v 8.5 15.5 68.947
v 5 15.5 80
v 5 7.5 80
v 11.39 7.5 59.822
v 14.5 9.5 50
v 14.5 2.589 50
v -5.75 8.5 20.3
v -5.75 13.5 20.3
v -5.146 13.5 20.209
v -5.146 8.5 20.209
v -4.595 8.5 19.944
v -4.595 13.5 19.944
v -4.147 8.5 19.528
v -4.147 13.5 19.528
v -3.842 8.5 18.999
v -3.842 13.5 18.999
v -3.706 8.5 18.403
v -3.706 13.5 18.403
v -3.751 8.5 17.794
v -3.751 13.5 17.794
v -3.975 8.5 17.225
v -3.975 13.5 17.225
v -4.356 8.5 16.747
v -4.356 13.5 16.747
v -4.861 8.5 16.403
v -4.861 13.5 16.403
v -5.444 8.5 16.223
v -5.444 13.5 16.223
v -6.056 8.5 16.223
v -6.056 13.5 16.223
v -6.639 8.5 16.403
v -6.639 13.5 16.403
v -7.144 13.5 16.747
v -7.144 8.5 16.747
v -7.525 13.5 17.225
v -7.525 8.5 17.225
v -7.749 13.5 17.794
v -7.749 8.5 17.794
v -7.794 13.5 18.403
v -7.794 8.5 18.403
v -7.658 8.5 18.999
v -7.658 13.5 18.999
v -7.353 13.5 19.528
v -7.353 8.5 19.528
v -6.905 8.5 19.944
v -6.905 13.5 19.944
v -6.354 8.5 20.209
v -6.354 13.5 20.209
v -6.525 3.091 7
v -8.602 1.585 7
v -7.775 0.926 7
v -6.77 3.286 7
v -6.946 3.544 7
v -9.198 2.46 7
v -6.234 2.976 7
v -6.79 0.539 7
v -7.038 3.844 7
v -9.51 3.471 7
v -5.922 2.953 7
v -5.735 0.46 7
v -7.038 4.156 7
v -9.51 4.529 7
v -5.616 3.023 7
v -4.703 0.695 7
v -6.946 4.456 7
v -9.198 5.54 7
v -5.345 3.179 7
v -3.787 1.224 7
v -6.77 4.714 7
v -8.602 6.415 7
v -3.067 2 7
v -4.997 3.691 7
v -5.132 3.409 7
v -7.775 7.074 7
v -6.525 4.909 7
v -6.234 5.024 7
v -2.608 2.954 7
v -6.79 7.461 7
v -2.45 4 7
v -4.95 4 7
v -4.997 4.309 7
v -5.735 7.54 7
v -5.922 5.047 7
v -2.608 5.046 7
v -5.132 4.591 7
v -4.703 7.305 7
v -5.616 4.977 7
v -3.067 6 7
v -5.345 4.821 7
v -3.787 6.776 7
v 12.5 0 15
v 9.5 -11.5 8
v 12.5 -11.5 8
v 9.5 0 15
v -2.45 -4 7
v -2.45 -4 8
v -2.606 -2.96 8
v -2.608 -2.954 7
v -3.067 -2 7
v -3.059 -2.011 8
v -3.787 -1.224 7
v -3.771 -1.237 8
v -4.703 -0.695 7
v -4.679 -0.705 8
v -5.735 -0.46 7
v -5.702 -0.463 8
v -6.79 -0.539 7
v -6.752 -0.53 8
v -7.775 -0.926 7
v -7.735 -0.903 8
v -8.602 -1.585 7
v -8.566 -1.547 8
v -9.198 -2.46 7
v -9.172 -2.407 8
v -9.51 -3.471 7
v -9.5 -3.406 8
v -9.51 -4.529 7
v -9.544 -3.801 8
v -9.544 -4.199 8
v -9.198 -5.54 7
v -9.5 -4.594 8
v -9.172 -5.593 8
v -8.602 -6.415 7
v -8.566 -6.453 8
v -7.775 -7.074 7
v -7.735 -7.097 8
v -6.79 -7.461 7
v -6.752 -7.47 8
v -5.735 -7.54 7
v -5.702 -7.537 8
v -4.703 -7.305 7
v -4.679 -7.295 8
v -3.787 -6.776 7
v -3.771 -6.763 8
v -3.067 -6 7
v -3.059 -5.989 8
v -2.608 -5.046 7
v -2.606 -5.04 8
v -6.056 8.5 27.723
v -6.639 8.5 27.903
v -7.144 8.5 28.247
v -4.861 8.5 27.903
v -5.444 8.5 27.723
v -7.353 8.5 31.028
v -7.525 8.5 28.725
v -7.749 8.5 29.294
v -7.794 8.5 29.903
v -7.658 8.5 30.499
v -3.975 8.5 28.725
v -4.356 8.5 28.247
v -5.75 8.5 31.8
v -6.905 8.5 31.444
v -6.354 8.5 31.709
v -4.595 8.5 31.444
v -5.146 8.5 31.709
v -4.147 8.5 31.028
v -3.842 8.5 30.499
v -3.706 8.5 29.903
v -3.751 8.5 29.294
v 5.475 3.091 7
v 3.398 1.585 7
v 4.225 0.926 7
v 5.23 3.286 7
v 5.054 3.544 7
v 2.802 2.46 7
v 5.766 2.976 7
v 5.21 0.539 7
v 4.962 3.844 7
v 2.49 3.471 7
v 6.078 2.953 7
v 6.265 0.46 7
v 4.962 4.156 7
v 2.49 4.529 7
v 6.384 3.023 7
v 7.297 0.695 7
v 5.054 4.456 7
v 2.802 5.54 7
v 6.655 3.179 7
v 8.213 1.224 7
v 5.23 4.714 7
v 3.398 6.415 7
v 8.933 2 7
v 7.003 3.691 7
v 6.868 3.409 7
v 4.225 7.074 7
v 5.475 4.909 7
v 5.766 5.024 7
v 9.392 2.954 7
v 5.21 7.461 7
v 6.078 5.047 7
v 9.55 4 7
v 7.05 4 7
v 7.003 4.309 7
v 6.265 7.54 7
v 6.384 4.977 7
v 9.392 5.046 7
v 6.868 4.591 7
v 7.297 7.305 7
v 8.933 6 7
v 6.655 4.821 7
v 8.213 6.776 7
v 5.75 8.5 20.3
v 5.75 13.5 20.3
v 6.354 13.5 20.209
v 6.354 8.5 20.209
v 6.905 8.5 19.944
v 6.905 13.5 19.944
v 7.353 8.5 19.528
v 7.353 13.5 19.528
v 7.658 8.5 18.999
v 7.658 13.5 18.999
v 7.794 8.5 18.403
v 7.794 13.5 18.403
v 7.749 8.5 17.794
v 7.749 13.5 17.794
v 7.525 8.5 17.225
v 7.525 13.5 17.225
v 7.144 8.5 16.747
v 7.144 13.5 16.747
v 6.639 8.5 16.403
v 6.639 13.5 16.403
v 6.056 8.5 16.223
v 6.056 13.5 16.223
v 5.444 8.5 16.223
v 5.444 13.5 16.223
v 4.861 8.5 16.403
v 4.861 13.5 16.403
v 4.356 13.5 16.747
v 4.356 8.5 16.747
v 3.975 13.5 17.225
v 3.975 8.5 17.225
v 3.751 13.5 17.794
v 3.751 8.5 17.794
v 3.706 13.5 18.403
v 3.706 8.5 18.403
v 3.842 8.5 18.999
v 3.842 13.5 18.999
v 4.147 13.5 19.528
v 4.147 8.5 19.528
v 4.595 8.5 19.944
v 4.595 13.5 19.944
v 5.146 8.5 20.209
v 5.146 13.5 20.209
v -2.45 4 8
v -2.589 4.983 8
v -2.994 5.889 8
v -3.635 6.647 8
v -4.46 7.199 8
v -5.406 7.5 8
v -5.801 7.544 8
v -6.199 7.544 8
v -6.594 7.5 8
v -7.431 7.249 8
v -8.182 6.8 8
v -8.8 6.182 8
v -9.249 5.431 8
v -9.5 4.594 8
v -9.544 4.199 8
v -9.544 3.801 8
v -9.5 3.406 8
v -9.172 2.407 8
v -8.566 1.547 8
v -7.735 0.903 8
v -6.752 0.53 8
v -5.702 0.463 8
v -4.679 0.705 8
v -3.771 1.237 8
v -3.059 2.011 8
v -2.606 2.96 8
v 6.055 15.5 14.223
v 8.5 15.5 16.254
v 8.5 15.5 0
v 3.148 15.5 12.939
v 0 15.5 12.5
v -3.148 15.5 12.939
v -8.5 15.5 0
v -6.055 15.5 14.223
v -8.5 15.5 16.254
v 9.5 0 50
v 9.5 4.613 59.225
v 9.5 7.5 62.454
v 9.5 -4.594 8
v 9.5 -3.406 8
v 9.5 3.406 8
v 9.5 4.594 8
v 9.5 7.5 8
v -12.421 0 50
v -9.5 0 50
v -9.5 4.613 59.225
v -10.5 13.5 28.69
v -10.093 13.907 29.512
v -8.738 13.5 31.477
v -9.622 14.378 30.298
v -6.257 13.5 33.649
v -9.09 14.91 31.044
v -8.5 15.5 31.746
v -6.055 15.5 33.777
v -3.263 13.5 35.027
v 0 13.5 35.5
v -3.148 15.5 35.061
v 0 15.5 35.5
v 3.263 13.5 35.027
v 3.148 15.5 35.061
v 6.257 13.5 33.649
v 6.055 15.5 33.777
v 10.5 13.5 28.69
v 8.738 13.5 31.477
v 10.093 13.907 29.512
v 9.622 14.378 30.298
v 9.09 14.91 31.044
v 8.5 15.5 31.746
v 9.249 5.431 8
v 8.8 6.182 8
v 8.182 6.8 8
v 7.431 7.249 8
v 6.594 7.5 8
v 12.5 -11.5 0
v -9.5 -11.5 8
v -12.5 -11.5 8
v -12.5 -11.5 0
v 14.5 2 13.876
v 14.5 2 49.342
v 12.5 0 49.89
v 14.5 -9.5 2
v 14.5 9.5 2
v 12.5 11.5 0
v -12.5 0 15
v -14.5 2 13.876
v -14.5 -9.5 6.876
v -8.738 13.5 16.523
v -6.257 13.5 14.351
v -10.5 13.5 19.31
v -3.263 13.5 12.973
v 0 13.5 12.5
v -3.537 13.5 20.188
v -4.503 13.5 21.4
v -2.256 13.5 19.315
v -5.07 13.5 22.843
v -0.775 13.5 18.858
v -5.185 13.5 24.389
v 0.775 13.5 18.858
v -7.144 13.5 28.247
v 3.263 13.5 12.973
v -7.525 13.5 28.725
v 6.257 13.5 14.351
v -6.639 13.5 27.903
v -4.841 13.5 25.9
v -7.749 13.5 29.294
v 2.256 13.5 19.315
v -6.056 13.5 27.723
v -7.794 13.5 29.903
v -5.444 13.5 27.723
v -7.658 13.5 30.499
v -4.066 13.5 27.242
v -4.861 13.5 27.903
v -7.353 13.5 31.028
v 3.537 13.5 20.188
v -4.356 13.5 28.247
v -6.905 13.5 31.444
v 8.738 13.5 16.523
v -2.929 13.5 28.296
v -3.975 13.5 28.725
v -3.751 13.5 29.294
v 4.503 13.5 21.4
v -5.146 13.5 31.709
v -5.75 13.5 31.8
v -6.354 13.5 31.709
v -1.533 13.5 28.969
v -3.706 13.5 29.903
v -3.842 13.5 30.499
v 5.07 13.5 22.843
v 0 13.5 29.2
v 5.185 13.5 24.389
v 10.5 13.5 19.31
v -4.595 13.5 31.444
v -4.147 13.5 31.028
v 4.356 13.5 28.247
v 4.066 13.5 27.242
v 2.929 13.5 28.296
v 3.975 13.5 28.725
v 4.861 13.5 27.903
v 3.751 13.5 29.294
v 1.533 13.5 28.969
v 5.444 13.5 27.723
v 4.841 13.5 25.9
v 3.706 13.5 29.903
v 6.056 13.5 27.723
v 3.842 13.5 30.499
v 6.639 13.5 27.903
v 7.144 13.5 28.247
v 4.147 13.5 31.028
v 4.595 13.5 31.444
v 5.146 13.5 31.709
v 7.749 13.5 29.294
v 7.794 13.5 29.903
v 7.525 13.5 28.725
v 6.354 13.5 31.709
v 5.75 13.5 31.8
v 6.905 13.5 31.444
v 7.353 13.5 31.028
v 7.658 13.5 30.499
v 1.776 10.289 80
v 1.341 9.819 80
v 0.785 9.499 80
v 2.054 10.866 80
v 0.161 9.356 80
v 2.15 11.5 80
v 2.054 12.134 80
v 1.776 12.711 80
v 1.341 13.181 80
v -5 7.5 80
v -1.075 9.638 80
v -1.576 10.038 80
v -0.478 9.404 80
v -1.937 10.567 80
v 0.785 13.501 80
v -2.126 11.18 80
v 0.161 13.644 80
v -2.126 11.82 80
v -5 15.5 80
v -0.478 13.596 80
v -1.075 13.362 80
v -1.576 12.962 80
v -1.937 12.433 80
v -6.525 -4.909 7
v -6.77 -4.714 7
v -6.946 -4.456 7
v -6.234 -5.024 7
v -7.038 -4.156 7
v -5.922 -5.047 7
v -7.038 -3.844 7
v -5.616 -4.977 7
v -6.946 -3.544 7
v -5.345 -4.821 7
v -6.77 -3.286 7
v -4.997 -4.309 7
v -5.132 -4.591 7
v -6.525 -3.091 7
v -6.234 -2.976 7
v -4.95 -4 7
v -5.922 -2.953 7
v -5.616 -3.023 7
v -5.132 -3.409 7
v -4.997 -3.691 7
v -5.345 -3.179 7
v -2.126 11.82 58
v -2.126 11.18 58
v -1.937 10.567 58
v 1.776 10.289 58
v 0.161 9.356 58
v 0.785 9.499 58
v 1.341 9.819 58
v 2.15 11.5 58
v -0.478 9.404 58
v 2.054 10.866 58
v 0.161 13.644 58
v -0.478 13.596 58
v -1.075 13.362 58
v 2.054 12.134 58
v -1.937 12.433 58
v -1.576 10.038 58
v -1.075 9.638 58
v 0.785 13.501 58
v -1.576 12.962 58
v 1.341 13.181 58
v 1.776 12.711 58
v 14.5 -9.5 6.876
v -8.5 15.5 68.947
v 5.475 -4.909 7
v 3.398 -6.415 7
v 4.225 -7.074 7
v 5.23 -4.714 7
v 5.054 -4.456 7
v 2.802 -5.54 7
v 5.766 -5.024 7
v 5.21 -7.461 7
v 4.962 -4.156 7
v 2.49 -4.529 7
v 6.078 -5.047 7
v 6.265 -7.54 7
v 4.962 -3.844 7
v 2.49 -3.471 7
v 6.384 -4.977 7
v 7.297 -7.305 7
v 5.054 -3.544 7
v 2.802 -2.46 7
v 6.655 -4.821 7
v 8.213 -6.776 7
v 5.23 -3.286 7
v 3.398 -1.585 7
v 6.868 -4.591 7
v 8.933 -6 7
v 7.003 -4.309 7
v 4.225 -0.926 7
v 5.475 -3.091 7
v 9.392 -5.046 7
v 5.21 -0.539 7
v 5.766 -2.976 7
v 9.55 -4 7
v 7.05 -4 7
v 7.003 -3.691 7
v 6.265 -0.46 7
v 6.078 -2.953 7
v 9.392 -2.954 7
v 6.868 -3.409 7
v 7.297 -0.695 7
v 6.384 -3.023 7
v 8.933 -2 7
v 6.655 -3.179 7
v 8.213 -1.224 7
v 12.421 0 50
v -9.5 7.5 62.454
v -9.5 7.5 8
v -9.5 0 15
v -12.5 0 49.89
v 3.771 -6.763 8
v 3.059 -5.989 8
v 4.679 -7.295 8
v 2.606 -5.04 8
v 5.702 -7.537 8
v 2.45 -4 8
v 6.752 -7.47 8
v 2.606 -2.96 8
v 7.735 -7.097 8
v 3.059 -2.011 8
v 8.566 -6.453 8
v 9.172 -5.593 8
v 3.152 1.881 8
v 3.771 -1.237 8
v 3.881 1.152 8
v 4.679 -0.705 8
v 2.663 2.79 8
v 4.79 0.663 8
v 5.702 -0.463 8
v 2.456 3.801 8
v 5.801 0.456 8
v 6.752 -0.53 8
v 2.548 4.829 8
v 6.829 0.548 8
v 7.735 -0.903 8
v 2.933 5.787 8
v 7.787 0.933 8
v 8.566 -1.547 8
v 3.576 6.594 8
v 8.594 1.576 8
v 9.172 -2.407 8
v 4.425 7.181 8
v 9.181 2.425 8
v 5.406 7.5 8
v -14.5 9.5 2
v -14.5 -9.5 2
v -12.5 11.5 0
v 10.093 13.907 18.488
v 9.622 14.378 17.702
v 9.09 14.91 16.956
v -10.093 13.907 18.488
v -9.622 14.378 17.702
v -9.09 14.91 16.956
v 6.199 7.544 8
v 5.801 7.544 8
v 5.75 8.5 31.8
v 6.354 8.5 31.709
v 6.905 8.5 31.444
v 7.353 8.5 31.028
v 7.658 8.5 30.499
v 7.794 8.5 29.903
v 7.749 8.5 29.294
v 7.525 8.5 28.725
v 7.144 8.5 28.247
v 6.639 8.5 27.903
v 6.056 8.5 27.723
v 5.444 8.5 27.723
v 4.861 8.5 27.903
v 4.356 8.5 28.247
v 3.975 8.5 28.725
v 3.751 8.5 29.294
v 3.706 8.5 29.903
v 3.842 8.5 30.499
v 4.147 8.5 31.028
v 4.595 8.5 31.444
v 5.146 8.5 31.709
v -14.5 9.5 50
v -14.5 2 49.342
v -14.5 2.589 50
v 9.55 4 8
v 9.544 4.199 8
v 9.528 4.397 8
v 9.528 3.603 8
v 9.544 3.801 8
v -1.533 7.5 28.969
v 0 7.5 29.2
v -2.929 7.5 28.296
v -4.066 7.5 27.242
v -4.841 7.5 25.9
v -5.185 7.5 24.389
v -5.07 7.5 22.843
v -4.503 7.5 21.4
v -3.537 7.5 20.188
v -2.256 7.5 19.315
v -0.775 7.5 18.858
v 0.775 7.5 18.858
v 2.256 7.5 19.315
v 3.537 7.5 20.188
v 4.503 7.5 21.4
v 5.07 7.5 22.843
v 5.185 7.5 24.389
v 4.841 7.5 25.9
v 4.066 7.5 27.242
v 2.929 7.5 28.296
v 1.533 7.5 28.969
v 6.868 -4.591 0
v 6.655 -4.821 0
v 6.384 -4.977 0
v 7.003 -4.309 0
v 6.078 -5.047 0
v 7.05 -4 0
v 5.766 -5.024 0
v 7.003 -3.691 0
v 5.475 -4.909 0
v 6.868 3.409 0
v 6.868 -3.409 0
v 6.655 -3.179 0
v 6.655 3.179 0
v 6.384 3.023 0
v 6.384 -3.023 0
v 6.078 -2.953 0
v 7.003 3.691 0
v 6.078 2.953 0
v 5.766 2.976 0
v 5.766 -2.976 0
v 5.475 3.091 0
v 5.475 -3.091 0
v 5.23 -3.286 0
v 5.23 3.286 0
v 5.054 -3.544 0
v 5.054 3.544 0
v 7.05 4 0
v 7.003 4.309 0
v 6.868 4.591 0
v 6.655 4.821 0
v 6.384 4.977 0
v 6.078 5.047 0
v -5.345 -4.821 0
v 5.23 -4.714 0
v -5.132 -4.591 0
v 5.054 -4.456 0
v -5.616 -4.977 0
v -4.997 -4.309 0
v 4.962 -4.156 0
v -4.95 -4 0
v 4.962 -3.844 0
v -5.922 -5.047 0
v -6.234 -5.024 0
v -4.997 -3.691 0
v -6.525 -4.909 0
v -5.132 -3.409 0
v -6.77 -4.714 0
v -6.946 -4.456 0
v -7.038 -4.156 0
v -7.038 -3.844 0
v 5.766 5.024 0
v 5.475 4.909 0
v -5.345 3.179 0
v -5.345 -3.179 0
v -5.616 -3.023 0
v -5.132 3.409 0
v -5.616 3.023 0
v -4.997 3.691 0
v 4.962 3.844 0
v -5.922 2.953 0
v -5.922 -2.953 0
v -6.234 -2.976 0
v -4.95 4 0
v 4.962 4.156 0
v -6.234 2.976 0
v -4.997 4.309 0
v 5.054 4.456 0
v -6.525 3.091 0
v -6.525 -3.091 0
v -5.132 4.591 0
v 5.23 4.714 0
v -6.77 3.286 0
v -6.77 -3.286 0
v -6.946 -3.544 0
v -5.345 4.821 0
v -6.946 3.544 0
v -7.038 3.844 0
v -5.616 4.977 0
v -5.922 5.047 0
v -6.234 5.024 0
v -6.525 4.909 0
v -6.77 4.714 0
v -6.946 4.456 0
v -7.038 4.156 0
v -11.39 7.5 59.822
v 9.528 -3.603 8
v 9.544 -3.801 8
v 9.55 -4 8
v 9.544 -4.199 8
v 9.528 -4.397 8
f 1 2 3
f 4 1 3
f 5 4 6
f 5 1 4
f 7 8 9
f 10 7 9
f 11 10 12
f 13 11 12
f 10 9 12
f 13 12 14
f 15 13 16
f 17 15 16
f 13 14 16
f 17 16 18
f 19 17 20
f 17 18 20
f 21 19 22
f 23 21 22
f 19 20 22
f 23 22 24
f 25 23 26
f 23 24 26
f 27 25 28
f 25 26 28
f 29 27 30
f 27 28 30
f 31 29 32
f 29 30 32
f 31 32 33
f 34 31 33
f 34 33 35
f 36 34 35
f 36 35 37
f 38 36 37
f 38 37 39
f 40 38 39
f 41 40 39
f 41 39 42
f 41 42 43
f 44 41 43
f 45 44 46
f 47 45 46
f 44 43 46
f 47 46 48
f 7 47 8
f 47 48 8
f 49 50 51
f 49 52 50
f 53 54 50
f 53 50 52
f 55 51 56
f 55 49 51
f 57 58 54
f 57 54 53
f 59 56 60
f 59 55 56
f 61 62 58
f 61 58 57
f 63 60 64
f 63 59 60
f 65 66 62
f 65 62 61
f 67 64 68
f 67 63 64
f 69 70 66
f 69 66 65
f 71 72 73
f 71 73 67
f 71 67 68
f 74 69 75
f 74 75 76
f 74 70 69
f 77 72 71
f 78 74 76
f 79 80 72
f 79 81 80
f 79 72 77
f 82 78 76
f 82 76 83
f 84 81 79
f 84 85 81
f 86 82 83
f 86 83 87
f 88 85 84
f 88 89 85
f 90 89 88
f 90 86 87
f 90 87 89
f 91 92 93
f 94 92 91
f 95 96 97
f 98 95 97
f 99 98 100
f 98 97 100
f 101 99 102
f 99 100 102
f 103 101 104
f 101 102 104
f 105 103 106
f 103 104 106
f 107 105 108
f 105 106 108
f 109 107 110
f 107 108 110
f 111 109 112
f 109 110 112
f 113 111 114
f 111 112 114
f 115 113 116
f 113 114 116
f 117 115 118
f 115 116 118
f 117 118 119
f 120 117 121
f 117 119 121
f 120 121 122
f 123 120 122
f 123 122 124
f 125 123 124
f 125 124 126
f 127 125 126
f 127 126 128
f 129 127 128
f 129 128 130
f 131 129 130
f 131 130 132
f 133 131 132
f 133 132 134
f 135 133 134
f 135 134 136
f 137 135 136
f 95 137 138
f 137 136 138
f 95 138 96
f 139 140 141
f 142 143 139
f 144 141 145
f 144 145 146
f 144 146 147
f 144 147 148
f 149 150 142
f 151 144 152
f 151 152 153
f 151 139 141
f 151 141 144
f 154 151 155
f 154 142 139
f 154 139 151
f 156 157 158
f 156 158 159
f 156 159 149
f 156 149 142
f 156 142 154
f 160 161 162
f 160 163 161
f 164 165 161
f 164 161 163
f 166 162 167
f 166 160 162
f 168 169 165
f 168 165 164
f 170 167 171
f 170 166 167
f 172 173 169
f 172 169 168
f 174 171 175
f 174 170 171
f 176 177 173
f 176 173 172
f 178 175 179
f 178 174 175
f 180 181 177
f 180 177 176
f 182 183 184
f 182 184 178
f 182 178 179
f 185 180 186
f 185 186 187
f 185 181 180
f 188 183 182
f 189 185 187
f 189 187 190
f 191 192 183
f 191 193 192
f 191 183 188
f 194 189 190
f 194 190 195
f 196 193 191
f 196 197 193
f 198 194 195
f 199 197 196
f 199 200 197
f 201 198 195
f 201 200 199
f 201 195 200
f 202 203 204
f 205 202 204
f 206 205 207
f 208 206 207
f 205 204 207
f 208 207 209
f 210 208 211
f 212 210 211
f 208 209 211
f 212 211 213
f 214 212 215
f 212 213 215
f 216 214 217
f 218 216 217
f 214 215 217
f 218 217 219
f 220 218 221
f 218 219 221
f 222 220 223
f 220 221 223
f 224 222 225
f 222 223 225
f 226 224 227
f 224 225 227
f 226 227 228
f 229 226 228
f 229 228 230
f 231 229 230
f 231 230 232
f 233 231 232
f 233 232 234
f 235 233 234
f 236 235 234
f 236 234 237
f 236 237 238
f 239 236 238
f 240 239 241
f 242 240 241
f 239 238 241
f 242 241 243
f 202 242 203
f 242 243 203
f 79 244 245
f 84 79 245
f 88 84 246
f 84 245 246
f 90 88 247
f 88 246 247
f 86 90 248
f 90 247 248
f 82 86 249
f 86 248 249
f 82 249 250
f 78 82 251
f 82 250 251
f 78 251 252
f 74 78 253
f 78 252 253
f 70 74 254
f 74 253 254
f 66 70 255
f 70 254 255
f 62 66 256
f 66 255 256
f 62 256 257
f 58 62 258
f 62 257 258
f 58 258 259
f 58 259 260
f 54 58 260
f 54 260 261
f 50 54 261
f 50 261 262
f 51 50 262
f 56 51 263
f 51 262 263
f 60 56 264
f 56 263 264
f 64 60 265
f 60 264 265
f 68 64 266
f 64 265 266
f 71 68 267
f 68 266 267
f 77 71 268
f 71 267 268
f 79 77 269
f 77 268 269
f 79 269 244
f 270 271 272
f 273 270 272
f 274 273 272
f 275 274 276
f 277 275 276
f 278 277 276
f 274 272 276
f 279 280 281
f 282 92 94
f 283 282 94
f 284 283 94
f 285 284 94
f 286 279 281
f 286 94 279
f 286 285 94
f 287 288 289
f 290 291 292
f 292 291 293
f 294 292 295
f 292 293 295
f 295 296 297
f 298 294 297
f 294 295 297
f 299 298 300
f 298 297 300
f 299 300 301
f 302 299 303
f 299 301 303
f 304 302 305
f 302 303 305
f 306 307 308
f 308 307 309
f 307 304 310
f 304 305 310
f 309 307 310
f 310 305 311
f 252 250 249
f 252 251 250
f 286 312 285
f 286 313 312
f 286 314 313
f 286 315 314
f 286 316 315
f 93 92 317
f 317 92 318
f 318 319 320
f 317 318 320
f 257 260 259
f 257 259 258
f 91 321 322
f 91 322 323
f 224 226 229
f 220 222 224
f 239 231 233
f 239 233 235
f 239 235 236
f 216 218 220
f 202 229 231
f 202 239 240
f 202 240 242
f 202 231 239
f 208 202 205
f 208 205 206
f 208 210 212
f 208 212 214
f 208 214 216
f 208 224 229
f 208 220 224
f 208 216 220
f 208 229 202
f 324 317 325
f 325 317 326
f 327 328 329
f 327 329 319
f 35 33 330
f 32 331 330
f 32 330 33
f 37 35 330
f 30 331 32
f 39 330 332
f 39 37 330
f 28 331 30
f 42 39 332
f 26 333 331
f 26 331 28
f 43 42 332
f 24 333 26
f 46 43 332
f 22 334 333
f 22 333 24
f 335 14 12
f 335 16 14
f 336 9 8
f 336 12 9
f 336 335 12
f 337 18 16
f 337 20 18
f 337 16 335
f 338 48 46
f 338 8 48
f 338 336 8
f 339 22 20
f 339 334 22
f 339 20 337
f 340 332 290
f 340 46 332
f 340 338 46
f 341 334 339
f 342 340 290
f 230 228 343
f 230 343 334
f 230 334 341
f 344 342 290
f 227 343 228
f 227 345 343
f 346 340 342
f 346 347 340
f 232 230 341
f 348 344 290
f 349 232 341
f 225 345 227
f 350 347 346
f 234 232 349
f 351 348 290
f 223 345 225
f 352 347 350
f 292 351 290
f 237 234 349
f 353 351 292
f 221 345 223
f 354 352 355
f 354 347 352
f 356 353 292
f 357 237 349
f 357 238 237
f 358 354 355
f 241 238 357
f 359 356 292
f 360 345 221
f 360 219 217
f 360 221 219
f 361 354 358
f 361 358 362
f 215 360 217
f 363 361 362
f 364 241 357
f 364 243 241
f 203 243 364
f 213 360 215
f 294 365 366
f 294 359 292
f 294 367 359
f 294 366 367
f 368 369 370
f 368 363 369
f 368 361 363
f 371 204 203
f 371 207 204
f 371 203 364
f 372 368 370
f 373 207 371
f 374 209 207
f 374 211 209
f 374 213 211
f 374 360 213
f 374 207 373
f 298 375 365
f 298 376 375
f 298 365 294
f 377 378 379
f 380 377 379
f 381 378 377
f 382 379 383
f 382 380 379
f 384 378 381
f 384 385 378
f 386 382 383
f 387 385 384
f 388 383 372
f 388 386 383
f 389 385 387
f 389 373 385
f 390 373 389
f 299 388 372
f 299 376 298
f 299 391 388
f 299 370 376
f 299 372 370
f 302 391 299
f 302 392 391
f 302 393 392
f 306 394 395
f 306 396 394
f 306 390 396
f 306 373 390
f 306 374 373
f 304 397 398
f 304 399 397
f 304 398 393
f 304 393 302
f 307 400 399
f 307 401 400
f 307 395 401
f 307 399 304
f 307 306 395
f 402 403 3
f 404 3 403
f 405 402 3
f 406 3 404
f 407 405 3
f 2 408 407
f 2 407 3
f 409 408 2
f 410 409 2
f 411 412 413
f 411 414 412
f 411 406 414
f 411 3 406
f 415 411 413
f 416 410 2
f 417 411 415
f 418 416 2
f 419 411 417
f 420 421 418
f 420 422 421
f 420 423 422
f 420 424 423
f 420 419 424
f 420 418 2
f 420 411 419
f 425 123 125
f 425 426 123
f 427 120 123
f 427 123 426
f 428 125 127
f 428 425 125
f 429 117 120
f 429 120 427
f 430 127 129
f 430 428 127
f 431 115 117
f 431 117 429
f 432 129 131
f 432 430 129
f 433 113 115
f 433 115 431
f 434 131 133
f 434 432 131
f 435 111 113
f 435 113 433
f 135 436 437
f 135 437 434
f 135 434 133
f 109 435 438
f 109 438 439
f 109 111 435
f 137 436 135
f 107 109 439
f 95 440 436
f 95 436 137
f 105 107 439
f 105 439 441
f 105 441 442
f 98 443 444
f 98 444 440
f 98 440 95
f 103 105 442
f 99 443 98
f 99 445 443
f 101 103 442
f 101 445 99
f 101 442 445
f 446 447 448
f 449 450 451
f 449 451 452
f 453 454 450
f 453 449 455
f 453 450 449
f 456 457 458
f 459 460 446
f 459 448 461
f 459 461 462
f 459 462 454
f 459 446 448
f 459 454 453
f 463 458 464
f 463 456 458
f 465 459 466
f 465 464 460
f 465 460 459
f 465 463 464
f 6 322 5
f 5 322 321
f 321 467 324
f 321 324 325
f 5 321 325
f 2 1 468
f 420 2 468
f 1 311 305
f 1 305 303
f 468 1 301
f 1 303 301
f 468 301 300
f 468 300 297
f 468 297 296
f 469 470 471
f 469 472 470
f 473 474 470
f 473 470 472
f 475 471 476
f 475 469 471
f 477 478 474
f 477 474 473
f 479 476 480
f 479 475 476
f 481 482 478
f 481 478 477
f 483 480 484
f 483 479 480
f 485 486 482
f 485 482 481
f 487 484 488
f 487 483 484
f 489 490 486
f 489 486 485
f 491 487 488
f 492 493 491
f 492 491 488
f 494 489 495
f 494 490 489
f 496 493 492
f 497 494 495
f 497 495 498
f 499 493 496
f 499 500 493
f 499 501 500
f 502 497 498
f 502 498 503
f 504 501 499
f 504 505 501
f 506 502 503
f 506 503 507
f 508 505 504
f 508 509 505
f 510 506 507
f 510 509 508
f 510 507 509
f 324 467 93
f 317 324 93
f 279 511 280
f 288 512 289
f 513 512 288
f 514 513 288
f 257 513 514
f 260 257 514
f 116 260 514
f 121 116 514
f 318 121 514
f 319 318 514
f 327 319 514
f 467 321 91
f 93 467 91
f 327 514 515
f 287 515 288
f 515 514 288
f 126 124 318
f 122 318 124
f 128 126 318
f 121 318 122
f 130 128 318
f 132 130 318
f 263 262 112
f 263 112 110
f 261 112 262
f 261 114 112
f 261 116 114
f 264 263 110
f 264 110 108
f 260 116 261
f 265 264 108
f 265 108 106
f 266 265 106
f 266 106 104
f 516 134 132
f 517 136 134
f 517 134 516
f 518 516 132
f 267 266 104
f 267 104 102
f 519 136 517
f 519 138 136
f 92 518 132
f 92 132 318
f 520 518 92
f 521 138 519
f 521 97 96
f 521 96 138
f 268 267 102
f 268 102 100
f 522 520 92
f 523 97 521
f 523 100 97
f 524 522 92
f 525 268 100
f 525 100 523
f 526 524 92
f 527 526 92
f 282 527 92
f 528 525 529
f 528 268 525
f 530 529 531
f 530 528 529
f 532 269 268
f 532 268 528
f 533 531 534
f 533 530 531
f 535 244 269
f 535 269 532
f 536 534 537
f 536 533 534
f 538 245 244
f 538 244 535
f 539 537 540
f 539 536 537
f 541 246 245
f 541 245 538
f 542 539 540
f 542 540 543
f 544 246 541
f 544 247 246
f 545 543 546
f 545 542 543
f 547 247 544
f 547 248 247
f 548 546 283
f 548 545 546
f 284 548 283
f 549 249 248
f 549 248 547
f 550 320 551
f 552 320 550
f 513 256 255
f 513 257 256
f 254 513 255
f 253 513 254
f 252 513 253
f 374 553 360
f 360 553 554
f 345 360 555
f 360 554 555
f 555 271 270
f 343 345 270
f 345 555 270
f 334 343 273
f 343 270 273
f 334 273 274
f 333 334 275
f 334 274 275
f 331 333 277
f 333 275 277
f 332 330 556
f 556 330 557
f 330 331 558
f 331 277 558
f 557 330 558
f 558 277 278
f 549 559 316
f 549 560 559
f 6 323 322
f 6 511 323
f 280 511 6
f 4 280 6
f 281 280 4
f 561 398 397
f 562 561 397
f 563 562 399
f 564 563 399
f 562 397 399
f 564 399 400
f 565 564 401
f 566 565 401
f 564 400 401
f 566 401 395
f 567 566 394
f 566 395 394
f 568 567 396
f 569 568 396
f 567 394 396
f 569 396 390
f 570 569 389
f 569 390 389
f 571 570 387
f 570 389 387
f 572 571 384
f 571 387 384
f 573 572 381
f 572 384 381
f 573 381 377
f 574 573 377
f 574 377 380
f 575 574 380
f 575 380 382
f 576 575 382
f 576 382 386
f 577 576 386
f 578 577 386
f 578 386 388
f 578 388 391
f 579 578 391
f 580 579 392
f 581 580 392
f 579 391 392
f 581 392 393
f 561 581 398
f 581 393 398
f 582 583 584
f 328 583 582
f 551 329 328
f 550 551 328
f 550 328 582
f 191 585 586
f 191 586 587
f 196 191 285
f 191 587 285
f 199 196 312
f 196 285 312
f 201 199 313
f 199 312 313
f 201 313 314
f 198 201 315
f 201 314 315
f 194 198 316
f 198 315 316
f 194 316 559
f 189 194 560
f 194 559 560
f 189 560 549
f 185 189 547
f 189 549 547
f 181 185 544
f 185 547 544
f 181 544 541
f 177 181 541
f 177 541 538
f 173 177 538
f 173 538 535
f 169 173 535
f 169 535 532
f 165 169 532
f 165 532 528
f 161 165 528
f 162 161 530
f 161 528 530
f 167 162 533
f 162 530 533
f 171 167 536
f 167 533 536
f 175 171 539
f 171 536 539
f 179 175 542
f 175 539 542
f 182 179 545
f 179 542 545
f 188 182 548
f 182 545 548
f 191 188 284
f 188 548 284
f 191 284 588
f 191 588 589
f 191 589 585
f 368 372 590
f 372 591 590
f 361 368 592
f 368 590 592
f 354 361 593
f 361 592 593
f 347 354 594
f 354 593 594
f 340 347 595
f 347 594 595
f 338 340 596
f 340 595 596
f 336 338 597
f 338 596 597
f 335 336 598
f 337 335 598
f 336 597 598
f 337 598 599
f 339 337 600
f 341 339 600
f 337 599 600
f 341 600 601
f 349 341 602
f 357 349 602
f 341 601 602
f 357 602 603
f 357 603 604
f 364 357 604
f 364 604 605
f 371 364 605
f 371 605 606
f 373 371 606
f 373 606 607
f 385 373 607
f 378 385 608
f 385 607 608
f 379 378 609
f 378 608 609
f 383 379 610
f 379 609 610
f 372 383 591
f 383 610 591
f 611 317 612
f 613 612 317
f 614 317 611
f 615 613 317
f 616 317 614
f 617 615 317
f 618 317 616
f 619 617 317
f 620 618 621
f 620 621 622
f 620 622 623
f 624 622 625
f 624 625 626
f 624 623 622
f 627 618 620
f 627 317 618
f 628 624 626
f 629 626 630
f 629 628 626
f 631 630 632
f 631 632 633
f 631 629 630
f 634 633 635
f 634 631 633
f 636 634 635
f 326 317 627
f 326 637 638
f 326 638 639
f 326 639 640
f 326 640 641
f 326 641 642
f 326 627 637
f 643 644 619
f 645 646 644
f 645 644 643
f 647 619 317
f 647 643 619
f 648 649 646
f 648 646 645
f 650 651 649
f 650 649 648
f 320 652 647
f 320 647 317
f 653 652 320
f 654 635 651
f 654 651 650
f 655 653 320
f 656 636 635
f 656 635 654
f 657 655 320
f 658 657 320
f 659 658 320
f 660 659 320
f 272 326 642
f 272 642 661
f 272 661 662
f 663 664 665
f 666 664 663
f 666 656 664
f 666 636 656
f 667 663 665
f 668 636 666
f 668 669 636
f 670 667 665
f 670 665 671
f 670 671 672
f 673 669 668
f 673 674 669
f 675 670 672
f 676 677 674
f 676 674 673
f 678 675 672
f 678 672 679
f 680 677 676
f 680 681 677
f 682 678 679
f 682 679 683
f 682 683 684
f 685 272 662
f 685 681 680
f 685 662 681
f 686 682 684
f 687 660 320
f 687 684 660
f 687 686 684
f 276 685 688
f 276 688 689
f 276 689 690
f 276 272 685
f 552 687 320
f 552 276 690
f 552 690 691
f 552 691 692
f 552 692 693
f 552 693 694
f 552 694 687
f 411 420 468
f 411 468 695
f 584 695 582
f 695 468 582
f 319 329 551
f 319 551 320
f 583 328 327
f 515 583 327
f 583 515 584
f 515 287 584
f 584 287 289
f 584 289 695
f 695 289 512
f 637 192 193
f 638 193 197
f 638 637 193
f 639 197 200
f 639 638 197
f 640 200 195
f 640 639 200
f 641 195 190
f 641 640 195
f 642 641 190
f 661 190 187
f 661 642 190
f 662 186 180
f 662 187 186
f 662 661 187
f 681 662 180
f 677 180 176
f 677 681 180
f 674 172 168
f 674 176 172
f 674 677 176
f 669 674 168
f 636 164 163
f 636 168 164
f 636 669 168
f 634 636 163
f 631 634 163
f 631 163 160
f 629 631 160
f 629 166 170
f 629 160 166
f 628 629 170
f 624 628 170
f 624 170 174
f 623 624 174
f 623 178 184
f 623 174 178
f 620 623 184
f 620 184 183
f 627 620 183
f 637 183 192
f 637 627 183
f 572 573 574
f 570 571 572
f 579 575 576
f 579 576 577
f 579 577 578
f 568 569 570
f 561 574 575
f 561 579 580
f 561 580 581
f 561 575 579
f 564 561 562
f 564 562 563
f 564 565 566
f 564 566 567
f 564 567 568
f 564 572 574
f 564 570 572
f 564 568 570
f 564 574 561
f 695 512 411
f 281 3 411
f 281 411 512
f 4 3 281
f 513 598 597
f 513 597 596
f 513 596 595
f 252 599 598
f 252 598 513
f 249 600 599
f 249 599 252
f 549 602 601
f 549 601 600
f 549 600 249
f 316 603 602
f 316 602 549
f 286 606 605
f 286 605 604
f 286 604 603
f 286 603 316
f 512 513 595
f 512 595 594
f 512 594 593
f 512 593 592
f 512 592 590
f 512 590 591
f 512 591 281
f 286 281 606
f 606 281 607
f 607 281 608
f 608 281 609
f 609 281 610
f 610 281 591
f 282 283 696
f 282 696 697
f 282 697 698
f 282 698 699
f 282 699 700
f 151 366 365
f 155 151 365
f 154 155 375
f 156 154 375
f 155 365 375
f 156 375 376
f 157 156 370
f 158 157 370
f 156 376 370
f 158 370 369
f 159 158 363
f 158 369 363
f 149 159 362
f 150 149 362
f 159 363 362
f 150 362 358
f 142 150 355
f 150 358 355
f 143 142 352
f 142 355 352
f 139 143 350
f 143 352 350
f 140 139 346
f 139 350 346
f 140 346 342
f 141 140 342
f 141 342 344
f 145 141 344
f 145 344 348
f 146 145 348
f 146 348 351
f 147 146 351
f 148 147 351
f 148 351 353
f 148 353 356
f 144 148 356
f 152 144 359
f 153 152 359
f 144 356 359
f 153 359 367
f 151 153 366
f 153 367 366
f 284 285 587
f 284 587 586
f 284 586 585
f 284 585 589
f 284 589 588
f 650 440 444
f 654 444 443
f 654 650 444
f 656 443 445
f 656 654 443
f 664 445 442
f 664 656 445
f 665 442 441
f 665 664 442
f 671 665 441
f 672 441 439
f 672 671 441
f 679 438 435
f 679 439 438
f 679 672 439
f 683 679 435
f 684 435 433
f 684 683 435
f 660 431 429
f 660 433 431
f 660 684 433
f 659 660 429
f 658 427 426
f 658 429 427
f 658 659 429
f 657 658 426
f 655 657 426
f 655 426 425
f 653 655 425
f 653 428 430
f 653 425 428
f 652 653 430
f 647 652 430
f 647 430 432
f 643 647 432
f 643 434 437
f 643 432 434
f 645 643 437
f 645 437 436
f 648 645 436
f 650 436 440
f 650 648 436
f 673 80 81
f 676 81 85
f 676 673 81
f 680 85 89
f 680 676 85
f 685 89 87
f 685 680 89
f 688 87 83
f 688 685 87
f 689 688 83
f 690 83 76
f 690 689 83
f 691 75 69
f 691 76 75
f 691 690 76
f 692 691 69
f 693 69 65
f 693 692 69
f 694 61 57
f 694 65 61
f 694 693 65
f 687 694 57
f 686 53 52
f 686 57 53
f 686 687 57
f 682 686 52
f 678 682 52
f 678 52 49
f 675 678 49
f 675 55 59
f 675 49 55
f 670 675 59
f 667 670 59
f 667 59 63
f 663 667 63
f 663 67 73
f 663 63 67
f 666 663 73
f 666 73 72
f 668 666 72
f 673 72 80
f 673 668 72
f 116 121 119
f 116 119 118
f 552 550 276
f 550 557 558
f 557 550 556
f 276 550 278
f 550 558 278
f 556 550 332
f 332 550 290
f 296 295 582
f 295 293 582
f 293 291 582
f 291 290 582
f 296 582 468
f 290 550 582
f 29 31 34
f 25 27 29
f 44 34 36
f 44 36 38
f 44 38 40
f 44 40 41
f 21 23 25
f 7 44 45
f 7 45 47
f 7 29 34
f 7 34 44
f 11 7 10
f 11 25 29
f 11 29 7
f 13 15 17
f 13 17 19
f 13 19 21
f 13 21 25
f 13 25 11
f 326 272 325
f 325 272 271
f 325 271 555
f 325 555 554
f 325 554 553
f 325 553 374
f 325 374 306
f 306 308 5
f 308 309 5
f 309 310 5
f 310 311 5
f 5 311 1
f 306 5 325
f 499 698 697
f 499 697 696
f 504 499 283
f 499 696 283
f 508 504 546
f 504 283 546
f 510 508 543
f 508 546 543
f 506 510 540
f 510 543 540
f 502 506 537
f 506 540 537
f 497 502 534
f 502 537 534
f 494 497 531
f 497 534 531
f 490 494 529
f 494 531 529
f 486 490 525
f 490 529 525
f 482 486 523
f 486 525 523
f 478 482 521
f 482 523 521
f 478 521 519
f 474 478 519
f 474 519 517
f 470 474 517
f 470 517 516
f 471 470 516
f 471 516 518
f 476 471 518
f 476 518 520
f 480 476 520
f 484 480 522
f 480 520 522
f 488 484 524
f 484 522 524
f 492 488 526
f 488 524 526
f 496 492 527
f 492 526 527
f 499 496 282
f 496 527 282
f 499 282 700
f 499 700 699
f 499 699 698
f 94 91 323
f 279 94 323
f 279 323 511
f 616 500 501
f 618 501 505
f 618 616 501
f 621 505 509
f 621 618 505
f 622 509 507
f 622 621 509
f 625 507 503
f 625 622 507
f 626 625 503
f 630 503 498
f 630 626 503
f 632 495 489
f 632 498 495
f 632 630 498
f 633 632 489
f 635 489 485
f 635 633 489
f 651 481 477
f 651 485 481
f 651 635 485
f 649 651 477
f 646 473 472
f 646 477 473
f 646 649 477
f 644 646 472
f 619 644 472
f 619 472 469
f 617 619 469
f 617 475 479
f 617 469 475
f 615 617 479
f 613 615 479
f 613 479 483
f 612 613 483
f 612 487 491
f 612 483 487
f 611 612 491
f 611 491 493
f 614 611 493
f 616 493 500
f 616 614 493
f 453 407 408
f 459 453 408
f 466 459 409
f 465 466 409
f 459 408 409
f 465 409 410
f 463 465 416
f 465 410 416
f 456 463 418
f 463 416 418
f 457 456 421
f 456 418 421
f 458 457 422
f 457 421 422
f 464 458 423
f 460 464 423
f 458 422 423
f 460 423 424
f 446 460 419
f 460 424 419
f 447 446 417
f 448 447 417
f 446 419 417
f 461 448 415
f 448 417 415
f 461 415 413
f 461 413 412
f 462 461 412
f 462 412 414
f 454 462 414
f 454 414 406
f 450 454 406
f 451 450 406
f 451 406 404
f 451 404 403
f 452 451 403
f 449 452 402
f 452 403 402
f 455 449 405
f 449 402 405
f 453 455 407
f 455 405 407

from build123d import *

# Parameters (mm, degrees)
SKETCH1_W           = 26
SKETCH1_H           = 23
SKETCH1_R           = 1.05
BOSS_EXTRUDE1_DEPTH = 8
SKETCH2_R           = 3.55
CUT_EXTRUDE1_DEPTH  = 1
BOSS_EXTRUDE2_DEPTH = 72
SKETCH4_W           = 80
SKETCH4_H           = 23
BOSS_EXTRUDE3_DEPTH = 1.5
SKETCH5_W           = 80
SKETCH5_H           = 23
BOSS_EXTRUDE4_DEPTH = 1.5
SKETCH6_W           = 29
SKETCH6_H           = 80
BOSS_EXTRUDE5_DEPTH = 2
CUT_EXTRUDE2_DEPTH  = 87.15828457
SKETCH8_W           = 30
SKETCH8_H           = 4
BOSS_EXTRUDE6_DEPTH = 29
CUT_EXTRUDE3_DEPTH  = 87.32062326
SKETCH10_W          = 15.789473684
SKETCH10_H          = 7.5
CUT_EXTRUDE4_DEPTH  = 87.874910072
CHAMFER1_SIZE2      = 7.5
CHAMFER1_SIZE       = 15
CHAMFER2_SIZE2      = 7.5
CHAMFER2_SIZE       = 15
CHAMFER3_SIZE       = 4
CHAMFER3_SIZE_2     = 10
SKETCH12_R          = 5.2
CUT_EXTRUDE5_DEPTH  = 86.060272748
SKETCH14_R          = 2.05
CUT_EXTRUDE6_DEPTH  = 5
SKETCH15_R          = 2.15
CUT_EXTRUDE8_DEPTH  = 22
SKETCH21_W          = 29
SKETCH21_H          = 2
CUT_EXTRUDE9_DEPTH  = 84.165497654
BOSS_EXTRUDE7_REACH = 84.768
SKETCH22_W          = 29
SKETCH22_H          = 2
SKETCH23_R          = 5.2
CUT_EXTRUDE10_DEPTH = 86.060272748
SKETCH24_R          = 11.5
CUT_EXTRUDE11_DEPTH = 2
CHAMFER6_SIZE       = 2


# Some blends are built 0.0001 mm under size
with BuildPart() as part:
    # Sketch1 → Boss-Extrude1 (new body)
    with BuildSketch(Plane.XY):
        Rectangle(SKETCH1_W, SKETCH1_H)
        with Locations((-6, 4)):
            Circle(SKETCH1_R, mode=Mode.SUBTRACT)
        with Locations((6, 4)):
            Circle(SKETCH1_R, mode=Mode.SUBTRACT)
        with Locations((-6, -4)):
            Circle(SKETCH1_R, mode=Mode.SUBTRACT)
        with Locations((6, -4)):
            Circle(SKETCH1_R, mode=Mode.SUBTRACT)
    extrude(amount=BOSS_EXTRUDE1_DEPTH)

    # Sketch2 → Cut-Extrude1 (cut)
    with BuildSketch(Plane.XY.offset(8)):
        with Locations((-6, 4)):
            Circle(SKETCH2_R)
        with Locations((6, 4)):
            Circle(SKETCH2_R)
        with Locations((6, -4)):
            Circle(SKETCH2_R)
        with Locations((-6, -4)):
            Circle(SKETCH2_R)
    extrude(amount=-CUT_EXTRUDE1_DEPTH, mode=Mode.SUBTRACT)

    # Sketch3 → Boss-Extrude2 (add)
    with BuildSketch(Plane.XY.offset(8)):
        Polygon((-13, 11.5), (13, 11.5), (13, 7.5), (13, -11.5), (9.5, -11.5), (9.5, 7.5), (-9.5, 7.5), (-9.5, -11.5), (-13, -11.5), (-13, 7.5), align=None)
    extrude(amount=BOSS_EXTRUDE2_DEPTH)

    # Sketch4 → Boss-Extrude3 (add)
    with BuildSketch(Plane.ZY.offset(13)):
        with Locations((40, 0)):
            Rectangle(SKETCH4_W, SKETCH4_H)
    extrude(amount=BOSS_EXTRUDE3_DEPTH)

    # Sketch5 → Boss-Extrude4 (add)
    with BuildSketch(Plane(origin=(13, 0, 0), x_dir=(0, 0, -1), z_dir=(1, 0, 0))):
        with Locations((-40, 0)):
            Rectangle(SKETCH5_W, SKETCH5_H)
    extrude(amount=BOSS_EXTRUDE4_DEPTH)

    # Sketch6 → Boss-Extrude5 (add)
    with BuildSketch(Plane(origin=(0, 11.5, 0), x_dir=(1, 0, 0), z_dir=(0, 1, 0))):
        with Locations((0, -40)):
            Rectangle(SKETCH6_W, SKETCH6_H)
    extrude(amount=BOSS_EXTRUDE5_DEPTH)

    # Sketch7 → Cut-Extrude2 (cut, through all)
    with BuildSketch(Plane(origin=(14.5, 0, 0), x_dir=(0, 0, -1), z_dir=(1, 0, 0))):
        Polygon((-8, -11.5), (-15, 0), (-52, 0), (-80, 7.5), (-80, -11.5), align=None)
    extrude(amount=-CUT_EXTRUDE2_DEPTH, mode=Mode.SUBTRACT)

    # Sketch8 → Boss-Extrude6 (add)
    with BuildSketch(Plane.ZY.offset(14.5)):
        with Locations((65, 15.5)):
            Rectangle(SKETCH8_W, SKETCH8_H)
    extrude(amount=-BOSS_EXTRUDE6_DEPTH)

    # Sketch9 → Cut-Extrude3 (cut, through all)
    with BuildSketch(Plane(origin=(0, 17.5, 0), x_dir=(1, 0, 0), z_dir=(0, 1, 0))):
        Polygon((-5, -80), (-14.5, -50), (-14.5, -80), align=None)
        Polygon((14.5, -50), (14.5, -80), (5, -80), align=None)
    extrude(amount=-CUT_EXTRUDE3_DEPTH, mode=Mode.SUBTRACT)

    # Sketch10 → Cut-Extrude4 (cut, through all)
    with BuildSketch(Plane(origin=(14.5, 0, 0), x_dir=(0, 0, -1), z_dir=(1, 0, 0))):
        with Locations((-57.894736842, 3.75)):
            Rectangle(SKETCH10_W, SKETCH10_H)
    extrude(amount=-CUT_EXTRUDE4_DEPTH, mode=Mode.SUBTRACT)

    # Chamfer1
    chamfer1_edges = [part.edges().sort_by_distance(p)[0] for p in [
        (12, 7.5, 50),
    ]]
    chamfer1_side = [part.faces().sort_by_distance(p)[0] for p in [
        (12, 7.5, 50.15),
    ]]
    chamfer(chamfer1_edges, length=CHAMFER1_SIZE - 0.0001, length2=CHAMFER1_SIZE2 - 0.0001, reference=chamfer1_side[0])  # a hair under: the kernel refuses the full size

    # Chamfer2
    chamfer2_edges = [part.edges().sort_by_distance(p)[0] for p in [
        (-12, 7.5, 50),
    ]]
    chamfer2_side = [part.faces().sort_by_distance(p)[0] for p in [
        (-12, 7.5, 50.15),
    ]]
    chamfer(chamfer2_edges, length=CHAMFER2_SIZE - 0.0001, length2=CHAMFER2_SIZE2 - 0.0001, reference=chamfer2_side[0])  # a hair under: the kernel refuses the full size

    # Chamfer3
    # the kernel refuses this chamfer: 10, 4 mm, written as the material it adds along each edge
    with BuildSketch(Plane(origin=(-14.5, 13.5, 50), x_dir=(0, 0.996016754004022, 0.08916628142572501), z_dir=(1, 0, 0))) as chamfer3_piece_1_section:
        Polygon((CHAMFER3_SIZE * 0.996016754004, -CHAMFER3_SIZE * 0.0891662814257), (-CHAMFER3_SIZE_2 * 0.0891662814257, -CHAMFER3_SIZE_2 * 0.996016754004), (0, 0), align=None)
    chamfer3_piece_1 = extrude(amount=29, mode=Mode.PRIVATE)
    chamfer3_piece_1 = split(chamfer3_piece_1, bisect_by=Plane(origin=(0, 17.5, 46.584895752), z_dir=(0, -1, 0)), keep=Keep.TOP, mode=Mode.PRIVATE)
    chamfer3_piece_1 = split(chamfer3_piece_1, bisect_by=Plane(origin=(-14.161378148, 14.736098837, 51.069332166), z_dir=(0.9533422253507436, 0, -0.3018917046944019)), keep=Keep.TOP, mode=Mode.PRIVATE)
    chamfer3_piece_1 = split(chamfer3_piece_1, bisect_by=Plane(origin=(14.161378148, 14.736098837, 51.069332166), z_dir=(-0.9533422253507436, 0, -0.30189170469440213)), keep=Keep.TOP, mode=Mode.PRIVATE)
    add(chamfer3_piece_1)

    # Sketch12 → Cut-Extrude5 (cut, through all)
    with BuildSketch(Plane(origin=(0, 13.5, 0), x_dir=(1, 0, 0), z_dir=(0, 1, 0))):
        with Locations(Location((0, -24, 0), (0, 0, 270))):
            Circle(SKETCH12_R)
    extrude(amount=-CUT_EXTRUDE5_DEPTH, mode=Mode.SUBTRACT)

    # Sketch14 → Cut-Extrude6 (cut)
    with BuildSketch(Plane(origin=(0, 13.5, 0), x_dir=(1, 0, 0), z_dir=(0, 1, 0))):
        with Locations(Location((5.75, -18.25, 0), (0, 0, 270))):
            Circle(SKETCH14_R)
        with Locations(Location((5.75, -29.75, 0), (0, 0, 270))):
            Circle(SKETCH14_R)
        with Locations(Location((-5.75, -29.75, 0), (0, 0, 270))):
            Circle(SKETCH14_R)
        with Locations(Location((-5.75, -18.25, 0), (0, 0, 270))):
            Circle(SKETCH14_R)
    extrude(amount=-CUT_EXTRUDE6_DEPTH, mode=Mode.SUBTRACT)

    # Sketch15 → Cut-Extrude8 (cut)
    with BuildSketch(Plane.XY.offset(80)):
        with Locations((0, 11.5)):
            Circle(SKETCH15_R)
    extrude(amount=-CUT_EXTRUDE8_DEPTH, mode=Mode.SUBTRACT)

    # Sketch21 → Cut-Extrude9 (cut, through all)
    with BuildSketch(Plane.XY.offset(80)):
        with Locations((0, 16.5)):
            Rectangle(SKETCH21_W, SKETCH21_H)
    extrude(amount=-CUT_EXTRUDE9_DEPTH, mode=Mode.SUBTRACT)

    # Boss-Extrude7: up to this face of the body (flat: up to its plane)
    boss_extrude7_end = Plane(part.part.faces().sort_by_distance((0, 14.5, 42.5))[0])
    # Sketch22 → Boss-Extrude7 (add, up to the picked face)
    with BuildSketch(Plane(origin=(0, 0, 0), x_dir=(-1, 0, 0), z_dir=(0, 0, -1)), mode=Mode.PRIVATE) as boss_extrude7_sk1:
        with Locations((0, 14.5)):
            Rectangle(SKETCH22_W, SKETCH22_H)
    boss_extrude7_tool1 = split(extrude(boss_extrude7_sk1.sketch, amount=-BOSS_EXTRUDE7_REACH, mode=Mode.PRIVATE), bisect_by=boss_extrude7_end, keep=Keep.BOTH, mode=Mode.PRIVATE)
    add(boss_extrude7_tool1.solids().sort_by(Axis((0, 14.5, 0), (0, 0, 1)))[0])

    # Sketch23 → Cut-Extrude10 (cut, through all)
    with BuildSketch(Plane(origin=(0, 13.5, 0), x_dir=(-1, 0, 0), z_dir=(0, -1, 0))):
        with Locations(Location((0, -24, 0), (0, 0, 270))):
            Circle(SKETCH23_R)
    extrude(amount=-CUT_EXTRUDE10_DEPTH, mode=Mode.SUBTRACT)

    # Sketch24 → Cut-Extrude11 (cut)
    with BuildSketch(Plane(origin=(0, 15.5, 0), x_dir=(1, 0, 0), z_dir=(0, 1, 0))):
        with Locations(Location((0, -24, 0), (0, 0, 270))):
            Circle(SKETCH24_R)
    extrude(amount=-CUT_EXTRUDE11_DEPTH, mode=Mode.SUBTRACT)

    # Chamfer4
    # the kernel refuses this chamfer: 6 mm, written as the material it takes off along each edge
    with BuildSketch(Plane(origin=(-14.5, 15.5, 87.032235027), x_dir=(-0.0274958766105865, -0.9996219169112968, 0), z_dir=(0, 0, -1)), Plane(origin=(14.5, 15.5, 87.032235027), x_dir=(-0.9996219169112969, 0.02749587661058649, 0), z_dir=(0, 0, -1))) as chamfer4_piece_1:
        with BuildLine():
            Line((6.172039171, 0), (-0.339282929, -6.162706761))
            Line((-0.339282929, -6.162706761), (-0.459237559, -6.159407256))
            ThreePointArc((-0.459237559, -6.159407256), (-0.204775362, -3.080386978), (-0.11995463, 0.003299505))
            Line((-0.11995463, 0.003299505), (0.003299505, 0.11995463))
            ThreePointArc((0.003299505, 0.11995463), (3.086985988, 0.035133898), (6.175338676, 0.11995463))
            Line((6.175338676, 0.11995463), (6.172039171, 0))
        make_face()
    extrude(amount=124.064470053, mode=Mode.SUBTRACT)

    # Chamfer5
    # the kernel refuses this chamfer: 2.336899136, 2 mm, written as the material it takes off along each edge
    with BuildSketch(Plane(origin=(-8.106777279, 10.094594893, 70.189124382), x_dir=(0.961659390492848, -0.1504091467073527, -0.22932140166955664), z_dir=(-0.2725155737769916, -0.43028487946482336, -0.8605754961378691))) as chamfer5_piece_1_section:
        with BuildLine():
            Line((2.067154496, 0), (-0.457557549, -2.368181214))
            Line((-0.457557549, -2.368181214), (-0.503642169, -2.360393606))
            ThreePointArc((-0.503642169, -2.360393606), (-0.246974517, -1.1810158), (-0.04608462, 0.007787608))
            Line((-0.04608462, 0.007787608), (0.001494452, 0.046714084))
            ThreePointArc((0.001494452, 0.046714084), (1.034014963, 0.013682238), (2.068648949, 0.046714084))
            Line((2.068648949, 0.046714084), (2.067154496, 0))
        make_face()
    chamfer5_piece_1 = extrude(amount=29.489973718, mode=Mode.PRIVATE)
    chamfer5_piece_1 = split(chamfer5_piece_1, bisect_by=Plane(origin=(-11.667443521, 7.5, 56.707905071), z_dir=(0, -1, 0)), keep=Keep.TOP, mode=Mode.PRIVATE)
    add(chamfer5_piece_1, mode=Mode.SUBTRACT)
    with BuildSketch(Plane(origin=(8.106777279, 10.094594893, 70.189124382), x_dir=(-0.961659390492848, -0.1504091467073528, -0.22932140166955695), z_dir=(0.27251557377699187, -0.4302848794648234, -0.860575496137869))) as chamfer5_piece_2_section:
        with BuildLine():
            Line((2.067154496, 0), (-0.457557549, 2.368181214))
            Line((-0.457557549, 2.368181214), (-0.503642169, 2.360393606))
            ThreePointArc((-0.503642169, 2.360393606), (-0.246974517, 1.1810158), (-0.04608462, -0.007787608))
            Line((-0.04608462, -0.007787608), (0.001494452, -0.046714084))
            ThreePointArc((0.001494452, -0.046714084), (1.034014963, -0.013682238), (2.068648949, -0.046714084))
            Line((2.068648949, -0.046714084), (2.067154496, 0))
        make_face()
    chamfer5_piece_2 = extrude(amount=29.489973718, mode=Mode.PRIVATE)
    chamfer5_piece_2 = split(chamfer5_piece_2, bisect_by=Plane(origin=(11.667443521, 7.5, 56.707905071), z_dir=(0, -1, 0)), keep=Keep.TOP, mode=Mode.PRIVATE)
    add(chamfer5_piece_2, mode=Mode.SUBTRACT)
    with BuildSketch(Plane(origin=(14.5, 0, 9.856634024), x_dir=(0.02749587661058647, 0.9996219169112968, 0), z_dir=(0, 0, 1))) as chamfer5_piece_3_section:
        with BuildLine():
            Line((2.05734639, 0), (-0.11309431, 2.054235587))
            Line((-0.11309431, 2.054235587), (-0.153079186, 2.053135752))
            ThreePointArc((-0.153079186, 2.053135752), (-0.068258454, 1.026795659), (-0.039984877, -0.001099835))
            Line((-0.039984877, -0.001099835), (0.001099835, -0.039984877))
            ThreePointArc((0.001099835, -0.039984877), (1.028995329, -0.011711299), (2.058446225, -0.039984877))
            Line((2.058446225, -0.039984877), (2.05734639, 0))
        make_face()
    chamfer5_piece_3 = extrude(amount=45.286731952, mode=Mode.PRIVATE)
    chamfer5_piece_3 = split(chamfer5_piece_3, bisect_by=Plane(origin=(13.83833288, 9.481660415, 20.77144547), z_dir=(0, -0.5199469468957453, 0.8541985556144386)), keep=Keep.TOP, mode=Mode.PRIVATE)
    add(chamfer5_piece_3, mode=Mode.SUBTRACT)
    with BuildSketch(Plane(origin=(-14.5, 4.393455788, 17.674277436), x_dir=(-0.027495876610586452, 0.519750363748101, -0.8538755975861659), z_dir=(0, -0.8541985556144386, -0.5199469468957453))) as chamfer5_piece_4_section:
        with BuildLine():
            Line((2.05734639, 0), (-0.11309431, 2.054235587))
            Line((-0.11309431, 2.054235587), (-0.153079186, 2.053135752))
            ThreePointArc((-0.153079186, 2.053135752), (-0.068258454, 1.026795659), (-0.039984877, -0.001099835))
            Line((-0.039984877, -0.001099835), (0.001099835, -0.039984877))
            ThreePointArc((0.001099835, -0.039984877), (1.028995329, -0.011711299), (2.058446225, -0.039984877))
            Line((2.058446225, -0.039984877), (2.05734639, 0))
        make_face()
    chamfer5_piece_4 = extrude(amount=23.74964397, mode=Mode.PRIVATE)
    chamfer5_piece_4 = split(chamfer5_piece_4, bisect_by=Plane(origin=(-13.835872305, 0, 9.503665371), z_dir=(0, -1, 0)), keep=Keep.TOP, mode=Mode.PRIVATE)
    add(chamfer5_piece_4, mode=Mode.SUBTRACT)
    with BuildSketch(Plane(origin=(14.5, -15.893455788, 5.325722564), x_dir=(0.027495876610586504, 0.5197503637481011, -0.8538755975861659), z_dir=(0, 0.8541985556144386, 0.5199469468957453))) as chamfer5_piece_5_section:
        with BuildLine():
            Line((2.05734639, 0), (-0.11309431, 2.054235587))
            Line((-0.11309431, 2.054235587), (-0.153079186, 2.053135752))
            ThreePointArc((-0.153079186, 2.053135752), (-0.068258454, 1.026795659), (-0.039984877, -0.001099835))
            Line((-0.039984877, -0.001099835), (0.001099835, -0.039984877))
            ThreePointArc((0.001099835, -0.039984877), (1.028995329, -0.011711299), (2.058446225, -0.039984877))
            Line((2.058446225, -0.039984877), (2.05734639, 0))
        make_face()
    chamfer5_piece_5 = extrude(amount=23.74964397, mode=Mode.PRIVATE)
    chamfer5_piece_5 = split(chamfer5_piece_5, bisect_by=Plane(origin=(13.835872305, 0, 9.503665371), z_dir=(0, -1, 0)), keep=Keep.TOP, mode=Mode.PRIVATE)
    add(chamfer5_piece_5, mode=Mode.SUBTRACT)
    with BuildSketch(Plane(origin=(14.5, -11.5, 13.143365976), x_dir=(0.027495876610586438, 0.9996219169112968, 0), z_dir=(0, 0, -1)), Plane(origin=(-14.5, -11.5, -5.143365976), x_dir=(-0.027495876610586487, 0.9996219169112968, 0), z_dir=(0, 0, 1))) as chamfer5_piece_6:
        with BuildLine():
            Line((2.05734639, 0), (-0.11309431, -2.054235587))
            Line((-0.11309431, -2.054235587), (-0.153079186, -2.053135752))
            ThreePointArc((-0.153079186, -2.053135752), (-0.068258454, -1.026795659), (-0.039984877, 0.001099835))
            Line((-0.039984877, 0.001099835), (0.001099835, 0.039984877))
            ThreePointArc((0.001099835, 0.039984877), (1.028995329, 0.011711299), (2.058446225, 0.039984877))
            Line((2.058446225, 0.039984877), (2.05734639, 0))
        make_face()
    extrude(amount=18.286731952, mode=Mode.SUBTRACT)
    with BuildSketch(Plane(origin=(-14.5, 0, 55.143365976), x_dir=(-0.027495876610586494, 0.9996219169112968, 0), z_dir=(0, 0, -1))) as chamfer5_piece_7_section:
        with BuildLine():
            Line((2.05734639, 0), (-0.11309431, 2.054235587))
            Line((-0.11309431, 2.054235587), (-0.153079186, 2.053135752))
            ThreePointArc((-0.153079186, 2.053135752), (-0.068258454, 1.026795659), (-0.039984877, -0.001099835))
            Line((-0.039984877, -0.001099835), (0.001099835, -0.039984877))
            ThreePointArc((0.001099835, -0.039984877), (1.028995329, -0.011711299), (2.058446225, -0.039984877))
            Line((2.058446225, -0.039984877), (2.05734639, 0))
        make_face()
    chamfer5_piece_7 = extrude(amount=45.286731952, mode=Mode.PRIVATE)
    chamfer5_piece_7 = split(chamfer5_piece_7, bisect_by=Plane(origin=(-13.83833288, 9.481660415, 20.77144547), z_dir=(0, -0.5199469468957453, 0.8541985556144386)), keep=Keep.TOP, mode=Mode.PRIVATE)
    add(chamfer5_piece_7, mode=Mode.SUBTRACT)
    with BuildSketch(Plane(origin=(14.5, 0, 9.856634024), x_dir=(0.02749587661058647, 0.9996219169112968, 0), z_dir=(0, 0, 1))) as chamfer5_piece_8a_section:
        with BuildLine():
            Line((2.05734639, 0), (-0.11309431, 2.054235587))
            Line((-0.11309431, 2.054235587), (-0.153079186, 2.053135752))
            ThreePointArc((-0.153079186, 2.053135752), (-0.068258454, 1.026795659), (-0.039984877, -0.001099835))
            Line((-0.039984877, -0.001099835), (0.001099835, -0.039984877))
            ThreePointArc((0.001099835, -0.039984877), (1.028995329, -0.011711299), (2.058446225, -0.039984877))
            Line((2.058446225, -0.039984877), (2.05734639, 0))
        make_face()
    chamfer5_piece_8a = extrude(amount=45.286731952, mode=Mode.PRIVATE)
    chamfer5_piece_8a = split(chamfer5_piece_8a, bisect_by=Plane(origin=(13.855319863, -0.547637516, 14.666655425), z_dir=(0, 0.5199469468957453, -0.8541985556144386)), keep=Keep.TOP, mode=Mode.PRIVATE)
    with BuildSketch(Plane(origin=(14.5, -15.893455788, 5.325722564), x_dir=(0.027495876610586504, 0.5197503637481011, -0.8538755975861659), z_dir=(0, 0.8541985556144386, 0.5199469468957453))) as chamfer5_piece_8b_section:
        with BuildLine():
            Line((2.05734639, 0), (-0.11309431, 2.054235587))
            Line((-0.11309431, 2.054235587), (-0.153079186, 2.053135752))
            ThreePointArc((-0.153079186, 2.053135752), (-0.068258454, 1.026795659), (-0.039984877, -0.001099835))
            Line((-0.039984877, -0.001099835), (0.001099835, -0.039984877))
            ThreePointArc((0.001099835, -0.039984877), (1.028995329, -0.011711299), (2.058446225, -0.039984877))
            Line((2.058446225, -0.039984877), (2.05734639, 0))
        make_face()
    chamfer5_piece_8b = extrude(amount=23.74964397, mode=Mode.PRIVATE)
    chamfer5_piece_8b = split(chamfer5_piece_8b, bisect_by=Plane(origin=(13.855319863, 0, 15.64111267), z_dir=(0, 1, 0)), keep=Keep.TOP, mode=Mode.PRIVATE)
    chamfer5_piece_8 = chamfer5_piece_8a & chamfer5_piece_8b
    add(chamfer5_piece_8, mode=Mode.SUBTRACT)
    with BuildSketch(Plane(origin=(-14.5, 0, 55.143365976), x_dir=(-0.027495876610586494, 0.9996219169112968, 0), z_dir=(0, 0, -1))) as chamfer5_piece_9a_section:
        with BuildLine():
            Line((2.05734639, 0), (-0.11309431, 2.054235587))
            Line((-0.11309431, 2.054235587), (-0.153079186, 2.053135752))
            ThreePointArc((-0.153079186, 2.053135752), (-0.068258454, 1.026795659), (-0.039984877, -0.001099835))
            Line((-0.039984877, -0.001099835), (0.001099835, -0.039984877))
            ThreePointArc((0.001099835, -0.039984877), (1.028995329, -0.011711299), (2.058446225, -0.039984877))
            Line((2.058446225, -0.039984877), (2.05734639, 0))
        make_face()
    chamfer5_piece_9a = extrude(amount=45.286731952, mode=Mode.PRIVATE)
    chamfer5_piece_9a = split(chamfer5_piece_9a, bisect_by=Plane(origin=(-13.855319863, -0.547637516, 14.666655425), z_dir=(0, 0.5199469468957453, -0.8541985556144386)), keep=Keep.TOP, mode=Mode.PRIVATE)
    with BuildSketch(Plane(origin=(-14.5, 4.393455788, 17.674277436), x_dir=(-0.027495876610586452, 0.519750363748101, -0.8538755975861659), z_dir=(0, -0.8541985556144386, -0.5199469468957453))) as chamfer5_piece_9b_section:
        with BuildLine():
            Line((2.05734639, 0), (-0.11309431, 2.054235587))
            Line((-0.11309431, 2.054235587), (-0.153079186, 2.053135752))
            ThreePointArc((-0.153079186, 2.053135752), (-0.068258454, 1.026795659), (-0.039984877, -0.001099835))
            Line((-0.039984877, -0.001099835), (0.001099835, -0.039984877))
            ThreePointArc((0.001099835, -0.039984877), (1.028995329, -0.011711299), (2.058446225, -0.039984877))
            Line((2.058446225, -0.039984877), (2.05734639, 0))
        make_face()
    chamfer5_piece_9b = extrude(amount=23.74964397, mode=Mode.PRIVATE)
    chamfer5_piece_9b = split(chamfer5_piece_9b, bisect_by=Plane(origin=(-13.855319863, 0, 15.64111267), z_dir=(0, 1, 0)), keep=Keep.TOP, mode=Mode.PRIVATE)
    chamfer5_piece_9 = chamfer5_piece_9a & chamfer5_piece_9b
    add(chamfer5_piece_9, mode=Mode.SUBTRACT)

    # Chamfer6
    chamfer6_edges = [part.edges().sort_by_distance(p)[0] for p in [
        (14.5, 0, 0),
        (-14.5, 0, 0),
    ]]
    chamfer(chamfer6_edges, length=CHAMFER6_SIZE)


solid = part.part
